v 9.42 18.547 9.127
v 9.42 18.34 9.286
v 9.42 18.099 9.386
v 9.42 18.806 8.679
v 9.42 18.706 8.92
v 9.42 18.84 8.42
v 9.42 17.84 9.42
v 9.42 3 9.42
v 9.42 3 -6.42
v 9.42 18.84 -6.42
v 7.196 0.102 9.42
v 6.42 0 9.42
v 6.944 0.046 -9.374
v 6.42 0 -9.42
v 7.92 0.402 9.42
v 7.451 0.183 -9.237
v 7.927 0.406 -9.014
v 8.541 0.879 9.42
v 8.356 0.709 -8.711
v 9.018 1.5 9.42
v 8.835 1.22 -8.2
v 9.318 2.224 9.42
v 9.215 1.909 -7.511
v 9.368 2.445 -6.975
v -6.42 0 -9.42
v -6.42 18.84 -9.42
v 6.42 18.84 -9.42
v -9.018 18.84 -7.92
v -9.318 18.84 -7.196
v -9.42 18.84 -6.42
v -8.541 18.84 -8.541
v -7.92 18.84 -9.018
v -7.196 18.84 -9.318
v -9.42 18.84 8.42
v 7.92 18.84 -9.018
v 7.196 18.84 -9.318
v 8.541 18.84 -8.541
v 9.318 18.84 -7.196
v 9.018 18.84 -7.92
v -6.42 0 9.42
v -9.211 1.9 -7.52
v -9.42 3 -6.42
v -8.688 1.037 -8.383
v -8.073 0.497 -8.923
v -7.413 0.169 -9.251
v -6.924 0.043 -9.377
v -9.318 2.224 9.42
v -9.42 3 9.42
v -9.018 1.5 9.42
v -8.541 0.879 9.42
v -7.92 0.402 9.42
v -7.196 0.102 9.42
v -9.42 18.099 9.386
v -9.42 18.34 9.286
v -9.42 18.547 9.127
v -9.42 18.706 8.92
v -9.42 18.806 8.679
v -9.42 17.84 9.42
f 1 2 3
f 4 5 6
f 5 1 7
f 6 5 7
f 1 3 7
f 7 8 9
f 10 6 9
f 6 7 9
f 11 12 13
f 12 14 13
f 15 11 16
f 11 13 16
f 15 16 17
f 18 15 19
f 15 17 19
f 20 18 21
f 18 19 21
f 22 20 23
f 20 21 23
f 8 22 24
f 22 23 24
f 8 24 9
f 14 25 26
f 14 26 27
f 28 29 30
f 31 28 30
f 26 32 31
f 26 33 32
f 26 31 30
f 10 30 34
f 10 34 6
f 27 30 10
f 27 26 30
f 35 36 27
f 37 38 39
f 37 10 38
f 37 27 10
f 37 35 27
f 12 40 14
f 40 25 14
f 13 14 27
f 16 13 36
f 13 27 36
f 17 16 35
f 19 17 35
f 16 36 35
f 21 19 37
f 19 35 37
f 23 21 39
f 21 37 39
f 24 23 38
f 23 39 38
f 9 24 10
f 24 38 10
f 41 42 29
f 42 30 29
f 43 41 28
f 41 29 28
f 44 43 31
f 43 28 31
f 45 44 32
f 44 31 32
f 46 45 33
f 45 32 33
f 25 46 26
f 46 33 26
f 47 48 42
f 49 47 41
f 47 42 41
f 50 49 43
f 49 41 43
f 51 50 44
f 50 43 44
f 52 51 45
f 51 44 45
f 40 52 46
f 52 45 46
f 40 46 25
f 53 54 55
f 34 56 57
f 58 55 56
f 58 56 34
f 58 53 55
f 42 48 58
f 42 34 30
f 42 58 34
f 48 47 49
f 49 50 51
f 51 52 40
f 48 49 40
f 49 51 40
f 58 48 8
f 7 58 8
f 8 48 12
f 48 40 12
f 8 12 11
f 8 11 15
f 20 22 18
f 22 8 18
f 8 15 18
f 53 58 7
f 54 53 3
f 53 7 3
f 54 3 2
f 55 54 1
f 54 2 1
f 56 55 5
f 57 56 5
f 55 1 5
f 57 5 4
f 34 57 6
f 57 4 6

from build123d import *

# Parameters (mm, degrees)
SKETCH_1_W      = 18.84
SKETCH_1_H      = 18.84
EXTRUDE_1_DEPTH = 18.84
FILLET_1_R      = 1
FILLET_2_R      = 3


with BuildPart() as part:
    # 草图1 → 凸台-拉伸1 (new body)
    with BuildSketch(Plane(origin=(0, 0, 0), x_dir=(1, 0, 0), z_dir=(0, 1, 0))):
        Rectangle(SKETCH_1_W, SKETCH_1_H)
    extrude(amount=EXTRUDE_1_DEPTH)

    # 圆角1
    fillet_1_edges = [part.edges().sort_by_distance(p)[0] for p in [
        (0, 18.84, 9.42),
    ]]
    fillet(fillet_1_edges, radius=FILLET_1_R)

    # 圆角2
    fillet_2_edges = [part.edges().sort_by_distance(p)[0] for p in [
        (-9.42, 0, 0),
        (9.42, 0, 0),
        (-9.42, 9.42, -9.42),
        (9.42, 9.42, -9.42),
    ]]
    fillet(fillet_2_edges, radius=FILLET_2_R)


solid = part.part
